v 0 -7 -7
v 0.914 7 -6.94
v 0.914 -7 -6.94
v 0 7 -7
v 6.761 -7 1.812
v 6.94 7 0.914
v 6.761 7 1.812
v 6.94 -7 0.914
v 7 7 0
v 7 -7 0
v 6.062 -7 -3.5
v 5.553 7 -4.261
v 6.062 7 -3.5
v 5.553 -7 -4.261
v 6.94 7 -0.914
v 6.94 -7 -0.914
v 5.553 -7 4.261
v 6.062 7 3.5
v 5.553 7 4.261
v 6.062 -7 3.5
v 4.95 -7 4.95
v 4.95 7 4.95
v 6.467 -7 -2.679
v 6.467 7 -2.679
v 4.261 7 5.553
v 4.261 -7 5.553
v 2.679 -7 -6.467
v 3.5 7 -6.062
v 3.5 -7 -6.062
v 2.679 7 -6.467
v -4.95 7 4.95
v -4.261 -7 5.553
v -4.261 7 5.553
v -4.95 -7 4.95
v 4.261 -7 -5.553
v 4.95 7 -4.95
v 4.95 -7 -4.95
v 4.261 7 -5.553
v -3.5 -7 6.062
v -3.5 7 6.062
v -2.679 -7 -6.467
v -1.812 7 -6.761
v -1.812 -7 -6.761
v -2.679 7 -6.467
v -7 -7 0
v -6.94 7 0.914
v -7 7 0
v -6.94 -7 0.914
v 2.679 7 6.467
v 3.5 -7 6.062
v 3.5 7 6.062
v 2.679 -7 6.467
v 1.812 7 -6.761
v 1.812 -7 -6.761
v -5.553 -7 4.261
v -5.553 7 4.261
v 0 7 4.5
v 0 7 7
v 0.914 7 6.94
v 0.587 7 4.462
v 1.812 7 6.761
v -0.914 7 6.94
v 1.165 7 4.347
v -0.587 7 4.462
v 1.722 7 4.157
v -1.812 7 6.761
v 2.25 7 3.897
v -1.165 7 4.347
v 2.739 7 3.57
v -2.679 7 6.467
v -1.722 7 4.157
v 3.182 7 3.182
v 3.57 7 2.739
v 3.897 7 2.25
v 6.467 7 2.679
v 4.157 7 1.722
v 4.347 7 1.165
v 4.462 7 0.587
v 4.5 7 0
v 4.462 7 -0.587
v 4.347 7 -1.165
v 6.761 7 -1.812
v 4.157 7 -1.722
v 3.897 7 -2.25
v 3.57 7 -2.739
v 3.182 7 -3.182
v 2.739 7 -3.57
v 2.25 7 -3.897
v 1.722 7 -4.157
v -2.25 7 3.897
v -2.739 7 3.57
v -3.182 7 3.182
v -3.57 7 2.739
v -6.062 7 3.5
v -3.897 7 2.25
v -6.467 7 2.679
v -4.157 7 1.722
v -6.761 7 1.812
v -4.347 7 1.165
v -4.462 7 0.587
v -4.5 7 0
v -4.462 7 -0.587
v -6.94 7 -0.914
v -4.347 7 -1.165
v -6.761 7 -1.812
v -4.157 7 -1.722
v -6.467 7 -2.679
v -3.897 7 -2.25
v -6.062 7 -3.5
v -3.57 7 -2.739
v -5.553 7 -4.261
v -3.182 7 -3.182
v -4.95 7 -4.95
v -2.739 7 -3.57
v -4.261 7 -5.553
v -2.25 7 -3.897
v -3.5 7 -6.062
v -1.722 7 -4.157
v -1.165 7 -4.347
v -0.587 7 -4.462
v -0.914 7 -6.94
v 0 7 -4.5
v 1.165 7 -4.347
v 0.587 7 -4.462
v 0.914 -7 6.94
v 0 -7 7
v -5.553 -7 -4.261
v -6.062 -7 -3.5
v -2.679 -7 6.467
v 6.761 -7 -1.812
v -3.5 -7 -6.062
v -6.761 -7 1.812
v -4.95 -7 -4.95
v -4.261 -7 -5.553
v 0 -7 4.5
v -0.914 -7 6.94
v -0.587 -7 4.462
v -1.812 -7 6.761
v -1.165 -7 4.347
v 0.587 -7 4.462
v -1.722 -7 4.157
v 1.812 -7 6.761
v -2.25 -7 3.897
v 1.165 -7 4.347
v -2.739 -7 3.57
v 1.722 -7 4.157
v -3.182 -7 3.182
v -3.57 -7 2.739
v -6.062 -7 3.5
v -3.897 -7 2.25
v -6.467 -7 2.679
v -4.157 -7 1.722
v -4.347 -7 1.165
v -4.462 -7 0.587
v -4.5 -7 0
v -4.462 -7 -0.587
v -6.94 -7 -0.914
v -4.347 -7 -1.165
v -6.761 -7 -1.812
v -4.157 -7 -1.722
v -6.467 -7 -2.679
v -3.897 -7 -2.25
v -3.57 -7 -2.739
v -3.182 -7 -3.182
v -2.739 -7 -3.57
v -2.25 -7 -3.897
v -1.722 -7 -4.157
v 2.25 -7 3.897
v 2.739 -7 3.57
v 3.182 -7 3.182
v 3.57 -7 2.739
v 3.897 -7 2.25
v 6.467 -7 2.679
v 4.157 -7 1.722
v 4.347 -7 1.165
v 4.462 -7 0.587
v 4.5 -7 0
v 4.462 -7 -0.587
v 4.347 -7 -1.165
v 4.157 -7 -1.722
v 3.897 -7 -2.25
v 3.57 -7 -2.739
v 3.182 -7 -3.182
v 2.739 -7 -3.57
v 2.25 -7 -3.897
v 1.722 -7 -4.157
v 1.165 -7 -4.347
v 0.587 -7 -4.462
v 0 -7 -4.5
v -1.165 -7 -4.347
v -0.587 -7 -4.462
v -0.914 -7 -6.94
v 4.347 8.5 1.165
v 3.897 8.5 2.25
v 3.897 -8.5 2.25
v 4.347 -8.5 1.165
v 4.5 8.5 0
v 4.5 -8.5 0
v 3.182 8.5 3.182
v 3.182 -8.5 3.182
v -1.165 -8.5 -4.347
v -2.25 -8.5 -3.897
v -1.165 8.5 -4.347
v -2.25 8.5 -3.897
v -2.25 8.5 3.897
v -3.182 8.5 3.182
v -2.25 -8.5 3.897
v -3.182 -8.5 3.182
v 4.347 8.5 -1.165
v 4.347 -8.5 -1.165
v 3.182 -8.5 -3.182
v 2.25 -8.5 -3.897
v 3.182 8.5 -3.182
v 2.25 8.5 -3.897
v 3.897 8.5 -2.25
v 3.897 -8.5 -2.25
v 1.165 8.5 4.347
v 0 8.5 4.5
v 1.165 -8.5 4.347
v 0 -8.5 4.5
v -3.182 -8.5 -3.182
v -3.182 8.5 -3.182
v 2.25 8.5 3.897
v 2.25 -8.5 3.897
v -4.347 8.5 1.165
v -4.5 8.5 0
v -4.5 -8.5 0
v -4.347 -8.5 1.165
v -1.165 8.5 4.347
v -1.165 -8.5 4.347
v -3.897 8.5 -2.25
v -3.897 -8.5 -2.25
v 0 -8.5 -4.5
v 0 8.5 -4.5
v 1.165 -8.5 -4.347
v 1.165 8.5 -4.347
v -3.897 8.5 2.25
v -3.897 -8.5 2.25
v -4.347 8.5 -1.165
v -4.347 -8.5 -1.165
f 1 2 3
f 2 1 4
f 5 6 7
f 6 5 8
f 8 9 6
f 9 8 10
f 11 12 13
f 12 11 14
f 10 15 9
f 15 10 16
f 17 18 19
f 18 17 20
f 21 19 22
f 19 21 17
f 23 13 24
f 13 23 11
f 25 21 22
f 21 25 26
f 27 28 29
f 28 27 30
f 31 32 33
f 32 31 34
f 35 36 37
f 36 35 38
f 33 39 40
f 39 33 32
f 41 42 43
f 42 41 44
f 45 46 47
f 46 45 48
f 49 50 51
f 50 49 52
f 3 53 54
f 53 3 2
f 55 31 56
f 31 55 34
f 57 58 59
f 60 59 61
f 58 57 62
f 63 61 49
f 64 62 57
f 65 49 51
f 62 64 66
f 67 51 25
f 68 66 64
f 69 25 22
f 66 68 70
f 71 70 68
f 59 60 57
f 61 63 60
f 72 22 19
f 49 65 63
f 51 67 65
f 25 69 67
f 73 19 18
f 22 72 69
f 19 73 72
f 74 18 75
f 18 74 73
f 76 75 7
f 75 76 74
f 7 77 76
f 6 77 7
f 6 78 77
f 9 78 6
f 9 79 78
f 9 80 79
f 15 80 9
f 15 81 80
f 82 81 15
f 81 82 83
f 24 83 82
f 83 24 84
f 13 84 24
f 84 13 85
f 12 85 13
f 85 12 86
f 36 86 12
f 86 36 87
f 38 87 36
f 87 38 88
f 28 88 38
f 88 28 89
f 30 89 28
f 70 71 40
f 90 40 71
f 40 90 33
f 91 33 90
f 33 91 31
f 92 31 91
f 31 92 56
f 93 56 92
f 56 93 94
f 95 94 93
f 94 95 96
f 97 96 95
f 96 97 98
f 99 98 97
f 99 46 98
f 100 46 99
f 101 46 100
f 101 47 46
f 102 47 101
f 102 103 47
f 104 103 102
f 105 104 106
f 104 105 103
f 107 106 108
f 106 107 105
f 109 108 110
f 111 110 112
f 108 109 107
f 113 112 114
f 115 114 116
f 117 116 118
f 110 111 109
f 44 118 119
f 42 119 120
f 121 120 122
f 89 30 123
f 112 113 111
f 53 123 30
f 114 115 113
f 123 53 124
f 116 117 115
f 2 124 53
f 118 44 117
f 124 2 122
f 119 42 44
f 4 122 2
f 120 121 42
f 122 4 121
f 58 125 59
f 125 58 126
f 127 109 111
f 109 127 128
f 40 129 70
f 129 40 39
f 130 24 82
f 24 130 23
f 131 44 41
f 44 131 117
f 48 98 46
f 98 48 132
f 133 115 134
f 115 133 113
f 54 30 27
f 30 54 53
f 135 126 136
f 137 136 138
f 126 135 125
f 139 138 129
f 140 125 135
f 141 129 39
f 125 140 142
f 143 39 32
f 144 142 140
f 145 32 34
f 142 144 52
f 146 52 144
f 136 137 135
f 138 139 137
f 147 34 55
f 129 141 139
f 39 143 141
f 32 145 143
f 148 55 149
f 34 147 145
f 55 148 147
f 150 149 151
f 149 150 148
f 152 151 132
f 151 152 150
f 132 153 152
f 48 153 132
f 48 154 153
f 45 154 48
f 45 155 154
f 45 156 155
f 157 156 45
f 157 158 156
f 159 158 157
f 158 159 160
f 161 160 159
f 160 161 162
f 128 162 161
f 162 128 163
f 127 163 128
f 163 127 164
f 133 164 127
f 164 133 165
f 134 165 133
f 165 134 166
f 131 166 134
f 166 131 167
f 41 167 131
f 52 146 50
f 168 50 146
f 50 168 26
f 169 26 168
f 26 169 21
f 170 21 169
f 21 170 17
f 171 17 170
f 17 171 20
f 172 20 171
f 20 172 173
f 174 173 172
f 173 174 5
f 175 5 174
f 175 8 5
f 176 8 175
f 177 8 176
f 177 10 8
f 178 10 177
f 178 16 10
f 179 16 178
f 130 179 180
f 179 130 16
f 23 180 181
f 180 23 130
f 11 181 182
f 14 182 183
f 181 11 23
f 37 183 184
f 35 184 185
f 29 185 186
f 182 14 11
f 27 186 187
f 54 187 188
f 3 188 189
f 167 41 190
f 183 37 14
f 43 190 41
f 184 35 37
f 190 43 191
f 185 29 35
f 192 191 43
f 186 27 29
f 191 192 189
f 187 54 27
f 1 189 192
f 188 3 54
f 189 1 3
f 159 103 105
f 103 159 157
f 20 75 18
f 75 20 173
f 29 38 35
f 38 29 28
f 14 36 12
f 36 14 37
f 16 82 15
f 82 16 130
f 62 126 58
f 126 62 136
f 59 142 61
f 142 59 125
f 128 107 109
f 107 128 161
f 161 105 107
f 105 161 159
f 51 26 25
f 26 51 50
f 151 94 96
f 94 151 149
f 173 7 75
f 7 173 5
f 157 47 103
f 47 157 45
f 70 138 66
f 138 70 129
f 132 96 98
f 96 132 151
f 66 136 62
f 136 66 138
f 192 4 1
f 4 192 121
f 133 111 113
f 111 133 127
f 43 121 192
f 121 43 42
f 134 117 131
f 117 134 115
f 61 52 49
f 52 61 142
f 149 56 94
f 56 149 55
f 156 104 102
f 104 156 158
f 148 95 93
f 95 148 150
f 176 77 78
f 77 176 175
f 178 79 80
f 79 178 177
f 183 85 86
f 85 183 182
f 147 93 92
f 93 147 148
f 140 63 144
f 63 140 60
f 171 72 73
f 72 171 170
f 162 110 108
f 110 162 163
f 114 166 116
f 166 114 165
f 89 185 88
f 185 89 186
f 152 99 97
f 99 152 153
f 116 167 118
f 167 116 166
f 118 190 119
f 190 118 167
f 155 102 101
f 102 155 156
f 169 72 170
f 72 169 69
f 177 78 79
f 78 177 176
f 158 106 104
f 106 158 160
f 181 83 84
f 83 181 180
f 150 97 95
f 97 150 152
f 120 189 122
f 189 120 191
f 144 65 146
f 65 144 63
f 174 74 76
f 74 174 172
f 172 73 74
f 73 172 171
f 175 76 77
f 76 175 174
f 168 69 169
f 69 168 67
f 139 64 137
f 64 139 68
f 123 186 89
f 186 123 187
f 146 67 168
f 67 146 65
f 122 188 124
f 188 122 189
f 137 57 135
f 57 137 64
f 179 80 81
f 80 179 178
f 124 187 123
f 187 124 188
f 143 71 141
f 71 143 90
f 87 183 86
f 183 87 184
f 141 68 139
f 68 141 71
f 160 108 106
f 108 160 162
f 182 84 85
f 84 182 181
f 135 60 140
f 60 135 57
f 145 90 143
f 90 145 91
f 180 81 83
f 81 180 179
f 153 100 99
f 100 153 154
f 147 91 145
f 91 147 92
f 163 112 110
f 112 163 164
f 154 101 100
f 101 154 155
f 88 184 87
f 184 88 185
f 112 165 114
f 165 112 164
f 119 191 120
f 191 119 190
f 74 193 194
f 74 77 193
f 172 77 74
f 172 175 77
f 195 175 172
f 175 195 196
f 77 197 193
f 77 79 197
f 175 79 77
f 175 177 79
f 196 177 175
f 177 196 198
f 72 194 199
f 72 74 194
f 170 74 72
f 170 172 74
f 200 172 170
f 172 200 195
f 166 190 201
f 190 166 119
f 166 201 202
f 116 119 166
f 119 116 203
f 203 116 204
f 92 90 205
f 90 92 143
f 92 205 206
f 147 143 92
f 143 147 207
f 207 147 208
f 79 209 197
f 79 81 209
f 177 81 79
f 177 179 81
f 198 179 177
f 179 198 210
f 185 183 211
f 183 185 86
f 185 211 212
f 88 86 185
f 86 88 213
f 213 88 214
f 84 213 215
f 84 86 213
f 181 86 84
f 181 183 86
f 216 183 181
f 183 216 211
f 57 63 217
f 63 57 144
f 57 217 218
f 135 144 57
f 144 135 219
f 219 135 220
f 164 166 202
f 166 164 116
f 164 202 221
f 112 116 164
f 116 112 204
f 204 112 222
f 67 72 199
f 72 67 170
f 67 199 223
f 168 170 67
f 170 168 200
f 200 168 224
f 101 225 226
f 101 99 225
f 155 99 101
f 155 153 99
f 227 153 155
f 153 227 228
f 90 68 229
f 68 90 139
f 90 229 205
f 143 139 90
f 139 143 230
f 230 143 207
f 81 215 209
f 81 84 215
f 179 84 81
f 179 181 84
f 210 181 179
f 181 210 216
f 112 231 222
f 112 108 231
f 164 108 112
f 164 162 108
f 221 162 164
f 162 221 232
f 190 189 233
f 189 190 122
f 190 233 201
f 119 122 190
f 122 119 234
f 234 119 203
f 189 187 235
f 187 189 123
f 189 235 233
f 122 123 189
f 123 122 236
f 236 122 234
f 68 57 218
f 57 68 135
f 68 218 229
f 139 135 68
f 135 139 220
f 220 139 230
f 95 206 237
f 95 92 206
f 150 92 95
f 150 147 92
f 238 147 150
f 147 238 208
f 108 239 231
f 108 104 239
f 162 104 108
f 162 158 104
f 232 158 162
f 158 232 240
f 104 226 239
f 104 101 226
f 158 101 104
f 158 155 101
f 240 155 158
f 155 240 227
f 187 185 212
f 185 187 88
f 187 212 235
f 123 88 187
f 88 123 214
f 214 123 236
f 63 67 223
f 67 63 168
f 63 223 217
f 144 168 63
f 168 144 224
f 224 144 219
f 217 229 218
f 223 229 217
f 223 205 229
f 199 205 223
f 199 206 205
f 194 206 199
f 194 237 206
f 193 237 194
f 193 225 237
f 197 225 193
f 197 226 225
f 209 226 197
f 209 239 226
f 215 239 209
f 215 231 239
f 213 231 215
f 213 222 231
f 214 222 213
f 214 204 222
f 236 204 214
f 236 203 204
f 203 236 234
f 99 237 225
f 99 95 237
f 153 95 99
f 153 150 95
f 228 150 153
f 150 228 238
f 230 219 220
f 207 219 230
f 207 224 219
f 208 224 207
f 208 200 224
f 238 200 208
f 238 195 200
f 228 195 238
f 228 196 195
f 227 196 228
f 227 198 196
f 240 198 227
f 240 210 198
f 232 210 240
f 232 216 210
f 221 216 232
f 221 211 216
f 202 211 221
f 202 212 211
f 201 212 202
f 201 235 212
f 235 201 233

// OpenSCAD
// file: wheel.scad
include <parameters.scad>

module wheel(r, width, idler = false) {
    rotate([90, 0, 0]) {
        color(matRubber)
            difference() {
                cylinder(r = r, h = width, center = true, $fn = 48);
                cylinder(r = r - 2.5, h = width + 1, center = true, $fn = 48);
            }

        color(matAluminum)
            cylinder(r = r - 3, h = width - 2, center = true, $fn = 32);

        color(matAluminum)
            cylinder(r = idler ? 5.5 : 4.5, h = width + 3, center = true, $fn = 24);

        for (i = [0 : 5])
            rotate([0, 0, i * 60])
                color(matAluminum)
                    cube([2.5, 3, width - 1], center = true);
    }
}

module driveWheel(r, width) {
    wheel(r, width, true);

    rotate([90, 0, 0])
        for (i = [0 : 11])
            rotate([0, 0, i * 30])
                color(matDarkSteel)
                    translate([r - 0.5, 0, 0])
                        cube([4, width + 2, 3.5], center = true);
}
// file: parameters.scad
// Shared parameters for tracked wheelchair prototype
// NOTE: 1 unit = 1 cm (seat target 450 mm = 45 units above ground).
$fn = 48;

//================ MATERIALS =================//
// Frame: aluminum 6061-T6 (lightweight)
// Seat: carbon fiber T700 + honeycomb (ultralight)
// Suspension: rubber bushings (lightweight)
// Axles: aluminum 7075-T6 (1/3 weight of steel)
matSteel      = [0.35, 0.36, 0.38];   // hardware / fasteners only
matDarkSteel  = [0.25, 0.26, 0.28];
matRubber     = [0.12, 0.12, 0.14];   // track belt + bushings
matAluminum   = [0.55, 0.57, 0.60];   // primary frame material
matChrome     = [0.70, 0.72, 0.75];
matCarbon     = [0.15, 0.15, 0.18];   // (unused — seat now aluminum)
matLeather    = [0.45, 0.25, 0.12];   // leather cushion color

//================ TRACKS =================//
trackLength = 82;
trackWidth = 14;
trackCenterY = 28;

idlerRadius = 10;
idlerX = trackLength / 2;
idlerZ = 16;
roadRadius = 7;
roadZ = 13;  // road wheels roll on the belt's inner surface (belt upper edge at this height)
roadPositions = [-22, -6, 10, 24];

linkLength = 10;
linkWidth = trackWidth + 2;
linkThickness = 3;
linkGap = 1;
// Belt centerline clears the idler wheels plus link half-thickness,
// so the links ride on the wheels instead of clipping through them.
trackRadius = idlerRadius + linkThickness / 2;  // = 11.5
beltThickness = 3;
groundZ = idlerZ - trackRadius;  // bottom of track = ground level (4.5)

//================ HYDRAULIC JACK WHEEL =================//
trackTilt = 0;
liftPivotX = idlerX;
liftPivotZ = idlerZ;
// Electric linear actuator (24V DC, 500kg, 300mm stroke).
// 1/3 weight of hydraulic system.
hydrWheelRadius = 4;
hydrWheelWidth = 10;
hydrBarrelRadius = 4;        // smaller barrel (mini actuator)
hydrBarrelHeight = 12;       // shorter barrel
hydrRodRadius = 2;
// At full extension the jack wheel rests on the ground:
// mountZ 35 - groundZ 4.5 - wheelR 4 = 26.5
hydrExtend = 26.5;
hydrRetracted = 0;
hydrExtendAmount = hydrExtend;
hydrMountX = 10;   // jack mount x; moved forward (from 24) for first-stair clearance
hydrMountY = 0;

//================ CHASSIS =================//
chassisLength = 82;
chassisBottom = 35;
chassisHeight = 12;

//================ SEAT =================//
// Seat geometry: flat aluminium pan + leather cushion + slim backrest.
// Seat surface rides at 450 mm (45 units) above the ground.
// topZ = idlerZ + seatTopOffset = 49.5, ground at 4.5 -> seat 45 above ground.
seatPanLength = 66;
seatPanWidth = 66;
backShellHeight = 72;
headrestHeight = 16;
seatTopOffset = 45 - trackRadius;  // = 33.5
// Backrest recline (deg from vertical).
seatBackRecline = 8;

//================ FOOTREST =================//
footrestWidth = 34;
footrestLength = 28;
footrestThickness = 3;       // 3mm aluminum plate
footrestHeight = idlerZ + 12;
footrestFrontX = -30 - footrestLength / 2;  // plate center, extends forward from arm end

// Folding footplate pivots at the end of the L-bracket arm.
footPivotX = -30;                           // end of L-bracket horizontal arm
footPivotZ = idlerZ + seatTopOffset - 7;    // arm height (panB - 2)
footHeelGuard = true;                       // optional heel guard
footToeGuard = false;                       // optional toe guard (off by default)

//================ ARMRESTS =================//
armPivotX = idlerX - 14;                     // rear post at the seat back
armLength = 68;                              // full-length pad (covers seat depth)
armPadHeight = idlerZ + seatTopOffset + 19;  // pad top = elbow height (~19 above seat top)
armPadWidth = 8;
armPadThick = 4;
// main file
// STL EXPORT: Road wheel (single)
include <parameters.scad>
use <wheel.scad>
wheel(roadRadius, trackWidth, false);
